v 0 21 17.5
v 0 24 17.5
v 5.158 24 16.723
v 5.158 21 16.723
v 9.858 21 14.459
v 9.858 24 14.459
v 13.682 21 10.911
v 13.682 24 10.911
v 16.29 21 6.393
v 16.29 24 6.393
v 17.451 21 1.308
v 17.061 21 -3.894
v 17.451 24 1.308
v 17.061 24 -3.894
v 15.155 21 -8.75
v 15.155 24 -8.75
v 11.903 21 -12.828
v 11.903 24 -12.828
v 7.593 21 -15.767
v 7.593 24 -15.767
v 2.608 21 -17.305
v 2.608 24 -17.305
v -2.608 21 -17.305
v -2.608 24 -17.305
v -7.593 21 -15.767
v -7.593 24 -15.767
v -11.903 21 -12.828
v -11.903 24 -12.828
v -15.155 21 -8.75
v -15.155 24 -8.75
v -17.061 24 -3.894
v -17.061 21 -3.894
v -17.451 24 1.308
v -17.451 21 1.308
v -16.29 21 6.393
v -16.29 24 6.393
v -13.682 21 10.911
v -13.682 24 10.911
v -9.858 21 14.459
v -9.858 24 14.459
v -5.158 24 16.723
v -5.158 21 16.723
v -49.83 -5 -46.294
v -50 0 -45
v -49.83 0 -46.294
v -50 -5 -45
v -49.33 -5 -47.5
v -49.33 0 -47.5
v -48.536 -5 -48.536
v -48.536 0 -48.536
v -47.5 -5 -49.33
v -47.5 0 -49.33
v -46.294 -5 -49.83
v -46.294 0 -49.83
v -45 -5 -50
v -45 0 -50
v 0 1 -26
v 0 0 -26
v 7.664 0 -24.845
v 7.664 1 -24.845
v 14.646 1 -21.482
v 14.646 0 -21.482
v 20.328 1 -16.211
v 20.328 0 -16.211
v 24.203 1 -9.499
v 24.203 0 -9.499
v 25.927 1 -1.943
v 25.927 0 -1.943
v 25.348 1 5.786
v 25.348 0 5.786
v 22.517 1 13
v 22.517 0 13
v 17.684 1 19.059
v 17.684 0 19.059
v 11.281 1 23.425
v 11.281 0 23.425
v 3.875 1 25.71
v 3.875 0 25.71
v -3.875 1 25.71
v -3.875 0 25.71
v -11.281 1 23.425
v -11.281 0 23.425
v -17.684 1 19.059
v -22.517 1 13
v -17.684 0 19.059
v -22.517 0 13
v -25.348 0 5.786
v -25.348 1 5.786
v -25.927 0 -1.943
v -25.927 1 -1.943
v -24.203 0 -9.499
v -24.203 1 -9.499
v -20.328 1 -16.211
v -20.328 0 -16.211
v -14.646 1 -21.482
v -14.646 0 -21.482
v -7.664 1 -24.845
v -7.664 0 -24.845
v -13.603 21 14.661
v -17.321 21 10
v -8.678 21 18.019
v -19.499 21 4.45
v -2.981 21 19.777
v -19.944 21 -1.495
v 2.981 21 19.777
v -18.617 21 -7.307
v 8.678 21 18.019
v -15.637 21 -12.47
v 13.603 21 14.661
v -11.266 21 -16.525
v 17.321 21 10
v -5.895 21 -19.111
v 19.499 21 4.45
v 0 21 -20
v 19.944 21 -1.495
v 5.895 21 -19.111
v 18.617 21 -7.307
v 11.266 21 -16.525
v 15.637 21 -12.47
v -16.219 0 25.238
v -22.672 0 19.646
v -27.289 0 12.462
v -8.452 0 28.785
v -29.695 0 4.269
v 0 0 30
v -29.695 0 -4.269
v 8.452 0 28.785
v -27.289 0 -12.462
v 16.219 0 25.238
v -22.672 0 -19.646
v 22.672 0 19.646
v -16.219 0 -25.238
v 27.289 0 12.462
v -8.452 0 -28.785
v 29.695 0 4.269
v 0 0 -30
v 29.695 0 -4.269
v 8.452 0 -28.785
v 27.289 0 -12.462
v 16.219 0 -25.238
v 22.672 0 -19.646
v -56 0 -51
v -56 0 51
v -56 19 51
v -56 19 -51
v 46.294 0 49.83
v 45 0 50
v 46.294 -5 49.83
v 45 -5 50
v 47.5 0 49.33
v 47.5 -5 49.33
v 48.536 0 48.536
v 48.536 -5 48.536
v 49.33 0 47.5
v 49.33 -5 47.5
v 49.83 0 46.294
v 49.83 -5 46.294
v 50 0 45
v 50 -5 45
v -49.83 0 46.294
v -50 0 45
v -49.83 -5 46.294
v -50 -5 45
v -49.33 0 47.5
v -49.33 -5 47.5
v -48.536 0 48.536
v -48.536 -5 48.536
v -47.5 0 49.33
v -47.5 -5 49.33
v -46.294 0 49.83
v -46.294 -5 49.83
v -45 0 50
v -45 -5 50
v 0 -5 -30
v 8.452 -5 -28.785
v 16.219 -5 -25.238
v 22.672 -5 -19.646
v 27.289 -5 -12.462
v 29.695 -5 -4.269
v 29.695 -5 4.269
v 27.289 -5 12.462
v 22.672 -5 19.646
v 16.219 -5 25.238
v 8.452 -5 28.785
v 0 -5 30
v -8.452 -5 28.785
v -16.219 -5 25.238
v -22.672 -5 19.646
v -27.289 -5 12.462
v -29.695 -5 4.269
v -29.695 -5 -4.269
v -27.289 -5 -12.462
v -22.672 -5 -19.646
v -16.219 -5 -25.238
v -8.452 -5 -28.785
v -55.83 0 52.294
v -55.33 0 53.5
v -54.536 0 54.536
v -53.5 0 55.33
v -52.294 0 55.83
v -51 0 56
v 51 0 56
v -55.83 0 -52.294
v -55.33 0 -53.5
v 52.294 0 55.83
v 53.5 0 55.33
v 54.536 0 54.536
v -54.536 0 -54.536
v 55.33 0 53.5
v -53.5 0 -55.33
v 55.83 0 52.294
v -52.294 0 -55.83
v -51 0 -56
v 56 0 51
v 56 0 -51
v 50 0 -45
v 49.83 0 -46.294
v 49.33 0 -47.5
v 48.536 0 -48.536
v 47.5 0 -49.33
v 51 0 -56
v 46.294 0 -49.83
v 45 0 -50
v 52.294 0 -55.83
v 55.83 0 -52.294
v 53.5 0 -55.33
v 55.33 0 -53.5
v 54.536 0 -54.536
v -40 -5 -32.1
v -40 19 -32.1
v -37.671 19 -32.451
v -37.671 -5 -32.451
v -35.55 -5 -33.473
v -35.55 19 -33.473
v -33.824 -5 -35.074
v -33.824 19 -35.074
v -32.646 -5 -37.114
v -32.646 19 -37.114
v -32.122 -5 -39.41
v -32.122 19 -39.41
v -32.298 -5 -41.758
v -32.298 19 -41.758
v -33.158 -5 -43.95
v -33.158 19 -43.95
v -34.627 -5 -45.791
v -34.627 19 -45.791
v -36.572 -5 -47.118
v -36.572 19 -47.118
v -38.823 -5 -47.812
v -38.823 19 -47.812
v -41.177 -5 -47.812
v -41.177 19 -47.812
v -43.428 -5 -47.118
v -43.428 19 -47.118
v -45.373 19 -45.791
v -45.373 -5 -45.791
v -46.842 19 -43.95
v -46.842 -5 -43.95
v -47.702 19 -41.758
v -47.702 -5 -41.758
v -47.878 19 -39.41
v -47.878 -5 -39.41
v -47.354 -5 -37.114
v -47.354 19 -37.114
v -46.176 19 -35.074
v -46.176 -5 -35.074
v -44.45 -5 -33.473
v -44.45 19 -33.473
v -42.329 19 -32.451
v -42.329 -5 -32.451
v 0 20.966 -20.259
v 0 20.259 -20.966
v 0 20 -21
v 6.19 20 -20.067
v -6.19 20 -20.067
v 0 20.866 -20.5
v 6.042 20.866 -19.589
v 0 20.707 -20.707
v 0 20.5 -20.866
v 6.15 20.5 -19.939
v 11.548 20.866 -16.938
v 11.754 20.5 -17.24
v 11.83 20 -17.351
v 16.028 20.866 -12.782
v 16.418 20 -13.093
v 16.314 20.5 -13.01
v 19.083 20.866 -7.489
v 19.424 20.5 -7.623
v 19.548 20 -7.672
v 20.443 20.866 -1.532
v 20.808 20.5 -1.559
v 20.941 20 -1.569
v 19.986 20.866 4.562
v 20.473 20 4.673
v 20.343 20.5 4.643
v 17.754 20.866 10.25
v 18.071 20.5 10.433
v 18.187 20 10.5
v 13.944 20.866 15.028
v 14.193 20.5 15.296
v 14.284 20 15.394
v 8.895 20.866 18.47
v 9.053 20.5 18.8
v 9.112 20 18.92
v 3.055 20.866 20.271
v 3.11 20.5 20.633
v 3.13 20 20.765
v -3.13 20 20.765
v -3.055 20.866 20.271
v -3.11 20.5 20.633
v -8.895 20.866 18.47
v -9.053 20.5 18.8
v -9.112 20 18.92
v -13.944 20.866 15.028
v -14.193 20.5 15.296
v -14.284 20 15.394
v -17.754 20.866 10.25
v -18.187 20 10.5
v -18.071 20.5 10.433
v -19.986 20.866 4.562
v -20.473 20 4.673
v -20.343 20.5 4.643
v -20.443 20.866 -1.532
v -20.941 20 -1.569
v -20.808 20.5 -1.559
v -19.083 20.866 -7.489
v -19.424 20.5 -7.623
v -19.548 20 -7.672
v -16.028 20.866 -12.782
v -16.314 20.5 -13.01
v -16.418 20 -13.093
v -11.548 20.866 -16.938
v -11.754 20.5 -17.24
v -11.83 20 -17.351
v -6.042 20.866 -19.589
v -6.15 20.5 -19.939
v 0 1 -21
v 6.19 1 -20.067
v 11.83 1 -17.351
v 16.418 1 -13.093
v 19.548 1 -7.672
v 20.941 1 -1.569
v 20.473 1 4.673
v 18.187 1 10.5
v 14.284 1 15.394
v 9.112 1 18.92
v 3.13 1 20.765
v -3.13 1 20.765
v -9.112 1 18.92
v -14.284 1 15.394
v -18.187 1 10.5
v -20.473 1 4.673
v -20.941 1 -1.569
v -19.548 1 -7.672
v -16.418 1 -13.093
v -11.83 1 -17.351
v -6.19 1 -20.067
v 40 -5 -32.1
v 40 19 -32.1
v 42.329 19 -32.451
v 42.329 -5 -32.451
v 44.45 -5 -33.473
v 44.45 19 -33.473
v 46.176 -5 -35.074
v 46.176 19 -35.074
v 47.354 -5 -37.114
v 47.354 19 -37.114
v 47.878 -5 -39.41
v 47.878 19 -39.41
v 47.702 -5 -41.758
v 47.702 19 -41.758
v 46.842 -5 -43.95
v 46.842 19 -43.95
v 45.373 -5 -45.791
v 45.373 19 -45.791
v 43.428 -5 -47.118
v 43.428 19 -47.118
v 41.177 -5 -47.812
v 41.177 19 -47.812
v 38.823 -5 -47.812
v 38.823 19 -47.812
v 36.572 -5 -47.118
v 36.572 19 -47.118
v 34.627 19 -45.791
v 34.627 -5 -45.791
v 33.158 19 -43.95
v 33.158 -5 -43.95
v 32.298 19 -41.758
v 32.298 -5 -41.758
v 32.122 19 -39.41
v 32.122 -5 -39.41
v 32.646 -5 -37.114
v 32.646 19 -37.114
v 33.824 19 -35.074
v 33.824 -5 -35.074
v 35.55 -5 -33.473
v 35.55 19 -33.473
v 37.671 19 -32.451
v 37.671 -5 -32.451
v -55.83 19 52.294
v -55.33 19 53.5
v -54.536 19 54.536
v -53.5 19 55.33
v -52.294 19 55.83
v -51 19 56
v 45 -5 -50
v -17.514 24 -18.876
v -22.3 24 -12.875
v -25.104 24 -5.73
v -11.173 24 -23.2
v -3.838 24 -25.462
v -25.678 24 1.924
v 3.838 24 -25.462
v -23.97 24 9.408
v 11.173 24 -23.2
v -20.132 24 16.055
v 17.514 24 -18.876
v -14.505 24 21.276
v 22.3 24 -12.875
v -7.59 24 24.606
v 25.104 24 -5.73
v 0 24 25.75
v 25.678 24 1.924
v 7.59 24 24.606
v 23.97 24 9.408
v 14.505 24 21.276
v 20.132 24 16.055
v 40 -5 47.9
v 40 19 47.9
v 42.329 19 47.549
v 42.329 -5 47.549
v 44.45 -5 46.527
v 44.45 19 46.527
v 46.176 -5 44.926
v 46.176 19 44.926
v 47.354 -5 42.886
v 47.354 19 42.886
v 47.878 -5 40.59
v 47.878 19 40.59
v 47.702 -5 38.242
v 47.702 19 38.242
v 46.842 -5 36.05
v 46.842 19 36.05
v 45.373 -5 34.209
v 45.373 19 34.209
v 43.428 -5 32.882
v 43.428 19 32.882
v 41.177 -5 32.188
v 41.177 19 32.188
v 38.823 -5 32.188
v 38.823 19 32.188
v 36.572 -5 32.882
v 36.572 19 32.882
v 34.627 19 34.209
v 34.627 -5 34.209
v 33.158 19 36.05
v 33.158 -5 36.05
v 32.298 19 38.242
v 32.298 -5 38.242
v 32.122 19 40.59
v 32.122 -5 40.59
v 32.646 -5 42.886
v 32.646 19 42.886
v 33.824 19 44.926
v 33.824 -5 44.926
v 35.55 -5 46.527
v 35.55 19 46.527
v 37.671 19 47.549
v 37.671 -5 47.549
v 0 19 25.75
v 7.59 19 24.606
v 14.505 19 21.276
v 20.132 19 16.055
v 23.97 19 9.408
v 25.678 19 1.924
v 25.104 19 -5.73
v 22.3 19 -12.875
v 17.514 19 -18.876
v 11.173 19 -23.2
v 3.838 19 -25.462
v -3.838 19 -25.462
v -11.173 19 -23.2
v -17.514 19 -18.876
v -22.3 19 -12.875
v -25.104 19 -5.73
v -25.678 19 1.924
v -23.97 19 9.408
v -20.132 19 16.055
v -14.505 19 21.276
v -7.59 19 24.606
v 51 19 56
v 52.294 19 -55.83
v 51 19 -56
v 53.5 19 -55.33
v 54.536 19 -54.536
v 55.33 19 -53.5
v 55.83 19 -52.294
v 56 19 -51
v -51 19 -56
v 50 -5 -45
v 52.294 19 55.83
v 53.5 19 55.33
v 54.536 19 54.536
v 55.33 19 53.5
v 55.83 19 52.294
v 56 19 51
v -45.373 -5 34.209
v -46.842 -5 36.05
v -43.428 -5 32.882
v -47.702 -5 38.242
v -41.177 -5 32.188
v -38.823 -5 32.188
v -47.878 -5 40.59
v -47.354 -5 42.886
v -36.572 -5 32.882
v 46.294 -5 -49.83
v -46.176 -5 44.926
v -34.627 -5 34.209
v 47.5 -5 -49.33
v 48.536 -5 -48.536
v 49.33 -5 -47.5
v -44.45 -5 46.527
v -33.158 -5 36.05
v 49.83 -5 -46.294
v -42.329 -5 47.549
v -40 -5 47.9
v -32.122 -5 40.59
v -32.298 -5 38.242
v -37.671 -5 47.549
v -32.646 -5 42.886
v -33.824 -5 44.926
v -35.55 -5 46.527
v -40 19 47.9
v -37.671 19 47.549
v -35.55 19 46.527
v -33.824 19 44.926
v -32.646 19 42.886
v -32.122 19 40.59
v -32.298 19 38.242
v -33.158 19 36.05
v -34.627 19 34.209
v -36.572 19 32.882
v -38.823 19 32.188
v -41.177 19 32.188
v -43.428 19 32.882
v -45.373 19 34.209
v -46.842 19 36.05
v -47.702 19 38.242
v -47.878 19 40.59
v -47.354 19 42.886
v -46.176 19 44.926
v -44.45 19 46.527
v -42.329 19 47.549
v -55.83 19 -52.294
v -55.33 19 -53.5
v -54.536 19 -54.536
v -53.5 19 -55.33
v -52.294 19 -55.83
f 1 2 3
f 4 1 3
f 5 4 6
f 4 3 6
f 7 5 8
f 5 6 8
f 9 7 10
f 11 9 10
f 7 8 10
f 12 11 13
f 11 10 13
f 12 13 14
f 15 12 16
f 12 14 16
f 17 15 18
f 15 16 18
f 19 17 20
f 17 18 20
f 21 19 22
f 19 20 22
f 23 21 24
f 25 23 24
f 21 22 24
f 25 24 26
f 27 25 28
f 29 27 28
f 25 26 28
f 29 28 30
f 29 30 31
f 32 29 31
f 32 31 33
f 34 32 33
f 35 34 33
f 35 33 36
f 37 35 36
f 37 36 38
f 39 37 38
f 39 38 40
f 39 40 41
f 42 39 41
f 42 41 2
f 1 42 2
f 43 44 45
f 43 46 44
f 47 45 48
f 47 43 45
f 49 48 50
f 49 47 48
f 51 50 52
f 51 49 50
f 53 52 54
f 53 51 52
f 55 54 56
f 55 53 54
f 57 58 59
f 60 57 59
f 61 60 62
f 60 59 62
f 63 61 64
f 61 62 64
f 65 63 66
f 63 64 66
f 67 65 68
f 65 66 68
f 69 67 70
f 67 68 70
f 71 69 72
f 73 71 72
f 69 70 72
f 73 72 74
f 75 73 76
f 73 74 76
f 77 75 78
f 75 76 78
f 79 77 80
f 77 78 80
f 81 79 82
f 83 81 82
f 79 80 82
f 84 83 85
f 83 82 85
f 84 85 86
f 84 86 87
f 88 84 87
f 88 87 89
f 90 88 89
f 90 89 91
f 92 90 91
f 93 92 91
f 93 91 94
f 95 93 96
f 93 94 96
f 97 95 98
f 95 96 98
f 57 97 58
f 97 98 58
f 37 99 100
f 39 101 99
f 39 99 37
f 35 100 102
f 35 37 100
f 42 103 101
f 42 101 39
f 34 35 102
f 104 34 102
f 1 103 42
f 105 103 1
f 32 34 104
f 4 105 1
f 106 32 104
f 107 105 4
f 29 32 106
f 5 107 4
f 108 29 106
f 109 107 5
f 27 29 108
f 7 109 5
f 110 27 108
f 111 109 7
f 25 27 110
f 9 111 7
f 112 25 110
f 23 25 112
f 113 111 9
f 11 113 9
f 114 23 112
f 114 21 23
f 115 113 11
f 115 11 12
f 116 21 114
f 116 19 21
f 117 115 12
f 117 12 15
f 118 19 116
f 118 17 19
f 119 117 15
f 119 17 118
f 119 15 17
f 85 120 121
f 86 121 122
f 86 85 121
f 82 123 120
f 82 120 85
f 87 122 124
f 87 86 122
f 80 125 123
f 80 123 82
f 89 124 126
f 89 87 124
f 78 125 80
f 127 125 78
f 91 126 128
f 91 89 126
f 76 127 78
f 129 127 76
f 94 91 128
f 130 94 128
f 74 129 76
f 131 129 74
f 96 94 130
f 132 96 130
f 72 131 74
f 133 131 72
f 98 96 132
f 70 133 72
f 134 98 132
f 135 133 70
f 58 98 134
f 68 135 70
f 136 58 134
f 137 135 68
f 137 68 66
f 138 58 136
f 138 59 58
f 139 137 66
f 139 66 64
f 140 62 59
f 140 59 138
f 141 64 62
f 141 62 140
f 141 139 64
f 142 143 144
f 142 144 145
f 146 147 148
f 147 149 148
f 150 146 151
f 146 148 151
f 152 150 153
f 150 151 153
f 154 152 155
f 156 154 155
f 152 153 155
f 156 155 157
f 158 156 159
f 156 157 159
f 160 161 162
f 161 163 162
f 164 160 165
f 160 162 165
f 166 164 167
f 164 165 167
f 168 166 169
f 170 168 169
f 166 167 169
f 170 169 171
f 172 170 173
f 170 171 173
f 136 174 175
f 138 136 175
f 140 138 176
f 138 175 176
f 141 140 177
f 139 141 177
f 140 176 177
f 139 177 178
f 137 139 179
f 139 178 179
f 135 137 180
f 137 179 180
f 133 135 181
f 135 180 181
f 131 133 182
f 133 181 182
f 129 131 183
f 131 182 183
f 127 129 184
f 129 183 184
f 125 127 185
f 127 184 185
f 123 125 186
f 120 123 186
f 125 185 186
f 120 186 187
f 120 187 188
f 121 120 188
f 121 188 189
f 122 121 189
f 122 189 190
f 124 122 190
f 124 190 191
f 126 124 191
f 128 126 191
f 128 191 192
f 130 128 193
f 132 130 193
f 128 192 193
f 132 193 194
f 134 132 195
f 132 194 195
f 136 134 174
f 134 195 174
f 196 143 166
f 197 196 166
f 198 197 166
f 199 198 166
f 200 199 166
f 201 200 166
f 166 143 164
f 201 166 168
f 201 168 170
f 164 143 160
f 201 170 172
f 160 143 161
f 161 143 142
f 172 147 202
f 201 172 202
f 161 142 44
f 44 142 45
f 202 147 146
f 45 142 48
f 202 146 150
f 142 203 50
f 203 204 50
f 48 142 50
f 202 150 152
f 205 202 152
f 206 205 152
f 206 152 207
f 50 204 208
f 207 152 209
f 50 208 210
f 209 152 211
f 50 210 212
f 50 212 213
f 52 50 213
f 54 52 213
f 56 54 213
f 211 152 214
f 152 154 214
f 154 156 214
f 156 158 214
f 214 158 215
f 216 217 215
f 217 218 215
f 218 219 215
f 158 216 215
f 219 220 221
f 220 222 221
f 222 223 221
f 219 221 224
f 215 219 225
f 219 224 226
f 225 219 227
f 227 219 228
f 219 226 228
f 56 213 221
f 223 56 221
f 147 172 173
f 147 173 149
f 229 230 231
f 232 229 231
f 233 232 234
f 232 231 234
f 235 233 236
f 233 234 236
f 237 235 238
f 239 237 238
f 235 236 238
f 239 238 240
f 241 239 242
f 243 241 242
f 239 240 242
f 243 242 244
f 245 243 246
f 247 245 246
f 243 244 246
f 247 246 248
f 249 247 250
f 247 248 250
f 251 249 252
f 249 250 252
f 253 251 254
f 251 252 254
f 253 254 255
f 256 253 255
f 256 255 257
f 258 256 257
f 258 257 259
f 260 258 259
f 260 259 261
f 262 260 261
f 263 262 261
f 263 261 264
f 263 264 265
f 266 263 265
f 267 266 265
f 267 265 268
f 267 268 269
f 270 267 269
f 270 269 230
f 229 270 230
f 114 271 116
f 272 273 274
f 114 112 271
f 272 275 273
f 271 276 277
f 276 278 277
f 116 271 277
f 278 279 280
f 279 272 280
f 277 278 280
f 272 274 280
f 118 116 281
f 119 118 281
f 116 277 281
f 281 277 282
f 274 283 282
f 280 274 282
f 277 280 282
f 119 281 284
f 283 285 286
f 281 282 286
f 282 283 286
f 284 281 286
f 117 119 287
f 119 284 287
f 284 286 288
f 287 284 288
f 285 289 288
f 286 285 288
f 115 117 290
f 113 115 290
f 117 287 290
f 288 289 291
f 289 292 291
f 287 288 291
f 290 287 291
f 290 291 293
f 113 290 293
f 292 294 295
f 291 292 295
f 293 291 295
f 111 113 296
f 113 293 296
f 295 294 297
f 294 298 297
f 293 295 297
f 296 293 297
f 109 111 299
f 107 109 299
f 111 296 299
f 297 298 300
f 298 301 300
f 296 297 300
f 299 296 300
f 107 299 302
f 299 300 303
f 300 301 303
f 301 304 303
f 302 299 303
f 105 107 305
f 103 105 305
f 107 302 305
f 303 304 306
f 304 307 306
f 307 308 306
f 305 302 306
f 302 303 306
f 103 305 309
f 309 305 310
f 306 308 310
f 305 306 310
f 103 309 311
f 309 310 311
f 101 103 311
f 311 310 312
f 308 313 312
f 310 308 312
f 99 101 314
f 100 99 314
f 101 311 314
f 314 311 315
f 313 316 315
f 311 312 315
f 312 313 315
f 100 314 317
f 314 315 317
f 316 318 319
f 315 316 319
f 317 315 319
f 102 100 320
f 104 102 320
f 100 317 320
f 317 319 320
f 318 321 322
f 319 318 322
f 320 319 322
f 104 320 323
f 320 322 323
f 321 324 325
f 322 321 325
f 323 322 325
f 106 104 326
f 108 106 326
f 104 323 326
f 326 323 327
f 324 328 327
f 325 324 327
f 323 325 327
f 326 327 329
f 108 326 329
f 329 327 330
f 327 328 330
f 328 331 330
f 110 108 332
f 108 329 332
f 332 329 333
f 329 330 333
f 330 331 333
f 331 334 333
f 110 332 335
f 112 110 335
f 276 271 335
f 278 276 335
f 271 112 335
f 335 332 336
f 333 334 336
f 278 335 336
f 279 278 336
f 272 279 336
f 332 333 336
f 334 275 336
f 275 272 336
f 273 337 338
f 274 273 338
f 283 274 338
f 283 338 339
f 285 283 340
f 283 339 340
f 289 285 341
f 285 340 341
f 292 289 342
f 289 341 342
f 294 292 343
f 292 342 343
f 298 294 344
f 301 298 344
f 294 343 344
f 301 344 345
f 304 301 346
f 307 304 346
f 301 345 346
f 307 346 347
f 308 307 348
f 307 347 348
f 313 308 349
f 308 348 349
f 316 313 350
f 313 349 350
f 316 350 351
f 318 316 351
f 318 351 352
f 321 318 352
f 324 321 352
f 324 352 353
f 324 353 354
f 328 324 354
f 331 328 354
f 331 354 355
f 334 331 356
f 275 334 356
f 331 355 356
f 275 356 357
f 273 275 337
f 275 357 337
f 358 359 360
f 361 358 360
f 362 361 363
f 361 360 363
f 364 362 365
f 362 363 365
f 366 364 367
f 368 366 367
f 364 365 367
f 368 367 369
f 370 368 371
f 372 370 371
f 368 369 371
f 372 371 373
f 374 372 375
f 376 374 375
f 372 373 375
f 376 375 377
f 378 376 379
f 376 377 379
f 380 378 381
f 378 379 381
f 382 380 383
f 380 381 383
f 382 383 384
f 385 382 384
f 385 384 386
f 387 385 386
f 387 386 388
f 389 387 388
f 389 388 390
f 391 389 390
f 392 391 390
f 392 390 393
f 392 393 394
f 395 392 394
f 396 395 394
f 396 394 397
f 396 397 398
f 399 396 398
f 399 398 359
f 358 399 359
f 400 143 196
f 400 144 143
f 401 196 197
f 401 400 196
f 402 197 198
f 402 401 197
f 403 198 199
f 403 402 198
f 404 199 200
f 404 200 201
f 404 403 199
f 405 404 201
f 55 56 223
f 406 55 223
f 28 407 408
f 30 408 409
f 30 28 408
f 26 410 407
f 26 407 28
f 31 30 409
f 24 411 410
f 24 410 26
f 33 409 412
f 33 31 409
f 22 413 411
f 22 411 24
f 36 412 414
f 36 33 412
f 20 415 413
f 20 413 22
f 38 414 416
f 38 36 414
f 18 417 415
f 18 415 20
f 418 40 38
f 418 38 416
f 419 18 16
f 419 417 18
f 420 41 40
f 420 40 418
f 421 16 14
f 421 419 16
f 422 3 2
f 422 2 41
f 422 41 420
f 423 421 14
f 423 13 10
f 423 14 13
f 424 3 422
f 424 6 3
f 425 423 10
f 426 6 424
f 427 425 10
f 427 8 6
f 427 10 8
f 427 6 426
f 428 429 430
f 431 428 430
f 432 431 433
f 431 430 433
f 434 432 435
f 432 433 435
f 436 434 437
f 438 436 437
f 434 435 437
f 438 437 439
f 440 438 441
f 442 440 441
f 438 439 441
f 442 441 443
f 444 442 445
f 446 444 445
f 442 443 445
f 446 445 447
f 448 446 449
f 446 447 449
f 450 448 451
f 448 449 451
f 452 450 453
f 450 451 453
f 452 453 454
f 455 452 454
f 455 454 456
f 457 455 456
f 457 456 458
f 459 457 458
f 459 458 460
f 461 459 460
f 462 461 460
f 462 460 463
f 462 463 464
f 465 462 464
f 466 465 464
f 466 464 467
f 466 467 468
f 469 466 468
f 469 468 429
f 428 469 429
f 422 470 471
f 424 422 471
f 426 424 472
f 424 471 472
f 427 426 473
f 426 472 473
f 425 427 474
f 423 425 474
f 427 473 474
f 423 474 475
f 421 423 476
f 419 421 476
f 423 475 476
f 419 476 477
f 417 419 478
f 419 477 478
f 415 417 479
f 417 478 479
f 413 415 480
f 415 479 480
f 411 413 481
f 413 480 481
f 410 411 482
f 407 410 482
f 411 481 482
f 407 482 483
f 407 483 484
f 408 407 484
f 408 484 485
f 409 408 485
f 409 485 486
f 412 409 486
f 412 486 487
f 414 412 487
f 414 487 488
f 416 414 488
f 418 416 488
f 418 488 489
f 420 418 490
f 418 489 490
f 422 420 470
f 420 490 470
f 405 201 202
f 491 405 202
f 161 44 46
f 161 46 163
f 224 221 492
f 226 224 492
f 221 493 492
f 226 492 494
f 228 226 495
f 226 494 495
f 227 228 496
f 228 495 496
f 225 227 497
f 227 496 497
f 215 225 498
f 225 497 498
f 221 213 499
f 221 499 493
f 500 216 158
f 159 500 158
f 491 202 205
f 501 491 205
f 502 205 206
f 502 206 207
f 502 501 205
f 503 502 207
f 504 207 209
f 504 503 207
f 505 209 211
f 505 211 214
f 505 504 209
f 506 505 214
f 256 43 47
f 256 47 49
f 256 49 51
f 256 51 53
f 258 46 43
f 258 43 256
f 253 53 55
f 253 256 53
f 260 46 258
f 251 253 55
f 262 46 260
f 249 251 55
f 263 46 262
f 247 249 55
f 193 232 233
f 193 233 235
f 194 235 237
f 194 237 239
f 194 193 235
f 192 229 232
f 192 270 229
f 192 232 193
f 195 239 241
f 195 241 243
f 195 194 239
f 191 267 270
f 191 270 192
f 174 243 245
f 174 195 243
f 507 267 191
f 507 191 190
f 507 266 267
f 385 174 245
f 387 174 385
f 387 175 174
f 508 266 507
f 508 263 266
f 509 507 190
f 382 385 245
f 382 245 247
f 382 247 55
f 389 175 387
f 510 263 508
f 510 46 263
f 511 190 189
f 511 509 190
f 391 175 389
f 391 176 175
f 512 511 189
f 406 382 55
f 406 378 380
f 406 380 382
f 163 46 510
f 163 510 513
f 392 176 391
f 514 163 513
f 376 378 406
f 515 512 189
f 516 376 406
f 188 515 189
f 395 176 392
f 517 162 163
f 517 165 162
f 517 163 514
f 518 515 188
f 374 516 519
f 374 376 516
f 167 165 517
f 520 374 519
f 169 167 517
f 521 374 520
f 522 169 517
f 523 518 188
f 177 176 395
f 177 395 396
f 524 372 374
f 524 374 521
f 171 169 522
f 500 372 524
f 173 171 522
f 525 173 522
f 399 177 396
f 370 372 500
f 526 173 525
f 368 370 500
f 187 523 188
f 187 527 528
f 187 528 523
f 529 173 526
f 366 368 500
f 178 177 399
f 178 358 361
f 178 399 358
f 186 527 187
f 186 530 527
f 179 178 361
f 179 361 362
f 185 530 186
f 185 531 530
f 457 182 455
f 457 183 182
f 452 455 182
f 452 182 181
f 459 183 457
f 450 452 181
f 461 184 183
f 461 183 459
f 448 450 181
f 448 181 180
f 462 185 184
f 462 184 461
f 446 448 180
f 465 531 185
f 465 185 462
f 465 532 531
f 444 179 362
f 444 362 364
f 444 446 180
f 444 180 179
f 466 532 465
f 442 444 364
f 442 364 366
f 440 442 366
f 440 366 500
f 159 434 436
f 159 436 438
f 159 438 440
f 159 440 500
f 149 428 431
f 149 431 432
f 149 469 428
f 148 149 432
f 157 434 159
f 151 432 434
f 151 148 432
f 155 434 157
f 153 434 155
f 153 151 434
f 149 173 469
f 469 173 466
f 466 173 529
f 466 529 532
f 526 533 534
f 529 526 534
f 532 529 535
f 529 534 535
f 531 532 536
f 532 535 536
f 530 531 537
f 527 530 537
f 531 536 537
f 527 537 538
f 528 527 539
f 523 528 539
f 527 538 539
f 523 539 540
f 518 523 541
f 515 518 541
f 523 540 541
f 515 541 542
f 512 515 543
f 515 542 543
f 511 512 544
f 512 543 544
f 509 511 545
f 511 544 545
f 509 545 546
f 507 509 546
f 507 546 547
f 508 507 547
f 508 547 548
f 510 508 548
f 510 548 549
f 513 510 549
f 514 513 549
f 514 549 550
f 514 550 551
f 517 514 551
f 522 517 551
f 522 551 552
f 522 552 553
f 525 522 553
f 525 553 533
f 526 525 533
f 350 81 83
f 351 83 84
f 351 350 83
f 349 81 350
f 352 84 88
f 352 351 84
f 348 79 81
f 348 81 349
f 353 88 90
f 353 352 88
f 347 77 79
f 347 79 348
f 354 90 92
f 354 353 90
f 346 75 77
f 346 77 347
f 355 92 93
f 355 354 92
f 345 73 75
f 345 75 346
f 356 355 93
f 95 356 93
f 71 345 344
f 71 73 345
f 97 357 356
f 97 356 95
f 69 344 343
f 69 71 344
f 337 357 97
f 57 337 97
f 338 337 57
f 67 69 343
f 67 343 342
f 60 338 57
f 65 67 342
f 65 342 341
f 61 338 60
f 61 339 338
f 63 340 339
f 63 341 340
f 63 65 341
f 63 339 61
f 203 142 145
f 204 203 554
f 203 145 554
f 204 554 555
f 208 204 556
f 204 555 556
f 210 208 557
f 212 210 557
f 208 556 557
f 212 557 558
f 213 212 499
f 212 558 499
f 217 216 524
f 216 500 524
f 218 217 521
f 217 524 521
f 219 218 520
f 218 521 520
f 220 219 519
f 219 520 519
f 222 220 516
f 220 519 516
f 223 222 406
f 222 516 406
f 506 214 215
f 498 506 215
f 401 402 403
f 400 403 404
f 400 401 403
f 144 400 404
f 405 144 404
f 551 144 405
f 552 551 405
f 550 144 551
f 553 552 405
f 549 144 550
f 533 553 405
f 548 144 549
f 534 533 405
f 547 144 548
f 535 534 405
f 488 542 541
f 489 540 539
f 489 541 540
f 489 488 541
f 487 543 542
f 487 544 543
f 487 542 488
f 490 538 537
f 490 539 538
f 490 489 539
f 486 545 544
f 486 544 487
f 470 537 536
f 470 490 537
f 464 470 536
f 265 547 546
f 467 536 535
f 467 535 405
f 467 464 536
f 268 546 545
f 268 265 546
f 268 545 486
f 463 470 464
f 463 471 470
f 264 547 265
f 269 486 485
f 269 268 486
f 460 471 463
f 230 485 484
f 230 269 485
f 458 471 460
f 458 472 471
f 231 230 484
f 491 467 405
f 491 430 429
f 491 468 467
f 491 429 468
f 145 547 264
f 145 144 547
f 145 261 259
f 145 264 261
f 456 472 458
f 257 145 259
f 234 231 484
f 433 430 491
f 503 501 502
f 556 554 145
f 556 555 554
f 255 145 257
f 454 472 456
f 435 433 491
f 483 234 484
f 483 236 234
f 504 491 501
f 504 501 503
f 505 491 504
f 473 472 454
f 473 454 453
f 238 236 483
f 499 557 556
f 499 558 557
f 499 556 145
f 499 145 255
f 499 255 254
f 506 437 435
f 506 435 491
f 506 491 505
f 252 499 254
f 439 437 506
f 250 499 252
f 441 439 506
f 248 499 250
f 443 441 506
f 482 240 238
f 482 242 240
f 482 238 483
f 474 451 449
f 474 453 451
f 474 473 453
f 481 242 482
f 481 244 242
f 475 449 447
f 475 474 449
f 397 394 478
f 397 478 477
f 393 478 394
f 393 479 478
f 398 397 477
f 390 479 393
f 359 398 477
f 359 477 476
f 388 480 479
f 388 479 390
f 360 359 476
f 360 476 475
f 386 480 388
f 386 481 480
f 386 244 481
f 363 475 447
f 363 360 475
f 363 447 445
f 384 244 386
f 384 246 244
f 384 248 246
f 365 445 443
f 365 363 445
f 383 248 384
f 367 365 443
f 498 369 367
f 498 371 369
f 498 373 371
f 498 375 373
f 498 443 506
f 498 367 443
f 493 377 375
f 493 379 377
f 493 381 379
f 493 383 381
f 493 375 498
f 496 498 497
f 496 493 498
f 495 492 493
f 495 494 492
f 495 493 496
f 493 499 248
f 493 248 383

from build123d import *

# Parameters (mm, degrees)
SKETCH_1_W          = 112
SKETCH_1_H          = 112
EXTRUDE_1_DEPTH     = 19
SKETCH_2_R          = 25.75
EXTRUDE_2_DEPTH     = 5
SKETCH_3_W          = 100
SKETCH_3_H          = 100
EXTRUDE_3_DEPTH     = 5
SKETCH_4_R          = 30
CUT_EXTRUDE_1_DEPTH = 5
SKETCH_5_R          = 26
CUT_EXTRUDE_2_DEPTH = 1
SKETCH_6_R          = 21
CUT_EXTRUDE_3_DEPTH = 20
SKETCH_7_R          = 17.5
CUT_EXTRUDE_4_DEPTH = 85.338603261
SKETCH_8_R          = 7.9
CUT_EXTRUDE_5_DEPTH = 83.752643462
FILLET_1_R          = 5
FILLET_2_R          = 1


with BuildPart() as part:
    # 草图1 → 凸台-拉伸1 (new body)
    with BuildSketch(Plane(origin=(0, 0, 0), x_dir=(1, 0, 0), z_dir=(0, 1, 0))):
        Rectangle(SKETCH_1_W, SKETCH_1_H)
    extrude(amount=EXTRUDE_1_DEPTH)

    # 草图2 → 凸台-拉伸2 (add)
    with BuildSketch(Plane(origin=(0, 19, 0), x_dir=(1, 0, 0), z_dir=(0, 1, 0))):
        with Locations(Location((0, 0, 0), (0, 0, 270))):
            Circle(SKETCH_2_R)
    extrude(amount=EXTRUDE_2_DEPTH)

    # 草图3 → 凸台-拉伸3 (add)
    with BuildSketch(Plane.XZ):
        Rectangle(SKETCH_3_W, SKETCH_3_H)
    extrude(amount=EXTRUDE_3_DEPTH)

    # 草图4 → 切除-拉伸1 (cut)
    with BuildSketch(Plane.XZ.offset(5)):
        with Locations(Location((0, 0, 0), (0, 0, 270))):
            Circle(SKETCH_4_R)
    extrude(amount=-CUT_EXTRUDE_1_DEPTH, mode=Mode.SUBTRACT)

    # 草图5 → 切除-拉伸2 (cut)
    with BuildSketch(Plane.XZ):
        with Locations(Location((0, 0, 0), (0, 0, 270))):
            Circle(SKETCH_5_R)
    extrude(amount=-CUT_EXTRUDE_2_DEPTH, mode=Mode.SUBTRACT)

    # 草图6 → 切除-拉伸3 (cut)
    with BuildSketch(Plane.XZ.offset(-1)):
        with Locations(Location((0, 0, 0), (0, 0, 270))):
            Circle(SKETCH_6_R)
    extrude(amount=-CUT_EXTRUDE_3_DEPTH, mode=Mode.SUBTRACT)

    # 草图7 → 切除-拉伸4 (cut, through all)
    with BuildSketch(Plane(origin=(0, 24, 0), x_dir=(1, 0, 0), z_dir=(0, 1, 0))):
        with Locations(Location((0, 0, 0), (0, 0, 270))):
            Circle(SKETCH_7_R)
    extrude(amount=-CUT_EXTRUDE_4_DEPTH, mode=Mode.SUBTRACT)

    # 草图8 → 切除-拉伸5 (cut, through all)
    with BuildSketch(Plane(origin=(0, 19, 0), x_dir=(1, 0, 0), z_dir=(0, 1, 0))):
        with Locations(Location((-40, 40, 0), (0, 0, 270))):
            Circle(SKETCH_8_R)
        with Locations(Location((40, 40, 0), (0, 0, 270))):
            Circle(SKETCH_8_R)
        with Locations(Location((40, -40, 0), (0, 0, 270))):
            Circle(SKETCH_8_R)
        with Locations(Location((-40, -40, 0), (0, 0, 270))):
            Circle(SKETCH_8_R)
    extrude(amount=-CUT_EXTRUDE_5_DEPTH, mode=Mode.SUBTRACT)

    # 圆角1
    fillet_1_edges = [part.edges().sort_by_distance(p)[0] for p in [
        (50, -2.5, -50),
        (50, -2.5, 50),
        (-50, -2.5, 50),
        (-50, -2.5, -50),
        (56, 9.5, 56),
        (-56, 9.5, 56),
        (-56, 9.5, -56),
        (56, 9.5, -56),
    ]]
    fillet(fillet_1_edges, radius=FILLET_1_R)

    # 圆角2
    fillet_2_edges = [part.edges().sort_by_distance(p)[0] for p in [
        (0, 21, 21),
    ]]
    fillet(fillet_2_edges, radius=FILLET_2_R)


solid = part.part
